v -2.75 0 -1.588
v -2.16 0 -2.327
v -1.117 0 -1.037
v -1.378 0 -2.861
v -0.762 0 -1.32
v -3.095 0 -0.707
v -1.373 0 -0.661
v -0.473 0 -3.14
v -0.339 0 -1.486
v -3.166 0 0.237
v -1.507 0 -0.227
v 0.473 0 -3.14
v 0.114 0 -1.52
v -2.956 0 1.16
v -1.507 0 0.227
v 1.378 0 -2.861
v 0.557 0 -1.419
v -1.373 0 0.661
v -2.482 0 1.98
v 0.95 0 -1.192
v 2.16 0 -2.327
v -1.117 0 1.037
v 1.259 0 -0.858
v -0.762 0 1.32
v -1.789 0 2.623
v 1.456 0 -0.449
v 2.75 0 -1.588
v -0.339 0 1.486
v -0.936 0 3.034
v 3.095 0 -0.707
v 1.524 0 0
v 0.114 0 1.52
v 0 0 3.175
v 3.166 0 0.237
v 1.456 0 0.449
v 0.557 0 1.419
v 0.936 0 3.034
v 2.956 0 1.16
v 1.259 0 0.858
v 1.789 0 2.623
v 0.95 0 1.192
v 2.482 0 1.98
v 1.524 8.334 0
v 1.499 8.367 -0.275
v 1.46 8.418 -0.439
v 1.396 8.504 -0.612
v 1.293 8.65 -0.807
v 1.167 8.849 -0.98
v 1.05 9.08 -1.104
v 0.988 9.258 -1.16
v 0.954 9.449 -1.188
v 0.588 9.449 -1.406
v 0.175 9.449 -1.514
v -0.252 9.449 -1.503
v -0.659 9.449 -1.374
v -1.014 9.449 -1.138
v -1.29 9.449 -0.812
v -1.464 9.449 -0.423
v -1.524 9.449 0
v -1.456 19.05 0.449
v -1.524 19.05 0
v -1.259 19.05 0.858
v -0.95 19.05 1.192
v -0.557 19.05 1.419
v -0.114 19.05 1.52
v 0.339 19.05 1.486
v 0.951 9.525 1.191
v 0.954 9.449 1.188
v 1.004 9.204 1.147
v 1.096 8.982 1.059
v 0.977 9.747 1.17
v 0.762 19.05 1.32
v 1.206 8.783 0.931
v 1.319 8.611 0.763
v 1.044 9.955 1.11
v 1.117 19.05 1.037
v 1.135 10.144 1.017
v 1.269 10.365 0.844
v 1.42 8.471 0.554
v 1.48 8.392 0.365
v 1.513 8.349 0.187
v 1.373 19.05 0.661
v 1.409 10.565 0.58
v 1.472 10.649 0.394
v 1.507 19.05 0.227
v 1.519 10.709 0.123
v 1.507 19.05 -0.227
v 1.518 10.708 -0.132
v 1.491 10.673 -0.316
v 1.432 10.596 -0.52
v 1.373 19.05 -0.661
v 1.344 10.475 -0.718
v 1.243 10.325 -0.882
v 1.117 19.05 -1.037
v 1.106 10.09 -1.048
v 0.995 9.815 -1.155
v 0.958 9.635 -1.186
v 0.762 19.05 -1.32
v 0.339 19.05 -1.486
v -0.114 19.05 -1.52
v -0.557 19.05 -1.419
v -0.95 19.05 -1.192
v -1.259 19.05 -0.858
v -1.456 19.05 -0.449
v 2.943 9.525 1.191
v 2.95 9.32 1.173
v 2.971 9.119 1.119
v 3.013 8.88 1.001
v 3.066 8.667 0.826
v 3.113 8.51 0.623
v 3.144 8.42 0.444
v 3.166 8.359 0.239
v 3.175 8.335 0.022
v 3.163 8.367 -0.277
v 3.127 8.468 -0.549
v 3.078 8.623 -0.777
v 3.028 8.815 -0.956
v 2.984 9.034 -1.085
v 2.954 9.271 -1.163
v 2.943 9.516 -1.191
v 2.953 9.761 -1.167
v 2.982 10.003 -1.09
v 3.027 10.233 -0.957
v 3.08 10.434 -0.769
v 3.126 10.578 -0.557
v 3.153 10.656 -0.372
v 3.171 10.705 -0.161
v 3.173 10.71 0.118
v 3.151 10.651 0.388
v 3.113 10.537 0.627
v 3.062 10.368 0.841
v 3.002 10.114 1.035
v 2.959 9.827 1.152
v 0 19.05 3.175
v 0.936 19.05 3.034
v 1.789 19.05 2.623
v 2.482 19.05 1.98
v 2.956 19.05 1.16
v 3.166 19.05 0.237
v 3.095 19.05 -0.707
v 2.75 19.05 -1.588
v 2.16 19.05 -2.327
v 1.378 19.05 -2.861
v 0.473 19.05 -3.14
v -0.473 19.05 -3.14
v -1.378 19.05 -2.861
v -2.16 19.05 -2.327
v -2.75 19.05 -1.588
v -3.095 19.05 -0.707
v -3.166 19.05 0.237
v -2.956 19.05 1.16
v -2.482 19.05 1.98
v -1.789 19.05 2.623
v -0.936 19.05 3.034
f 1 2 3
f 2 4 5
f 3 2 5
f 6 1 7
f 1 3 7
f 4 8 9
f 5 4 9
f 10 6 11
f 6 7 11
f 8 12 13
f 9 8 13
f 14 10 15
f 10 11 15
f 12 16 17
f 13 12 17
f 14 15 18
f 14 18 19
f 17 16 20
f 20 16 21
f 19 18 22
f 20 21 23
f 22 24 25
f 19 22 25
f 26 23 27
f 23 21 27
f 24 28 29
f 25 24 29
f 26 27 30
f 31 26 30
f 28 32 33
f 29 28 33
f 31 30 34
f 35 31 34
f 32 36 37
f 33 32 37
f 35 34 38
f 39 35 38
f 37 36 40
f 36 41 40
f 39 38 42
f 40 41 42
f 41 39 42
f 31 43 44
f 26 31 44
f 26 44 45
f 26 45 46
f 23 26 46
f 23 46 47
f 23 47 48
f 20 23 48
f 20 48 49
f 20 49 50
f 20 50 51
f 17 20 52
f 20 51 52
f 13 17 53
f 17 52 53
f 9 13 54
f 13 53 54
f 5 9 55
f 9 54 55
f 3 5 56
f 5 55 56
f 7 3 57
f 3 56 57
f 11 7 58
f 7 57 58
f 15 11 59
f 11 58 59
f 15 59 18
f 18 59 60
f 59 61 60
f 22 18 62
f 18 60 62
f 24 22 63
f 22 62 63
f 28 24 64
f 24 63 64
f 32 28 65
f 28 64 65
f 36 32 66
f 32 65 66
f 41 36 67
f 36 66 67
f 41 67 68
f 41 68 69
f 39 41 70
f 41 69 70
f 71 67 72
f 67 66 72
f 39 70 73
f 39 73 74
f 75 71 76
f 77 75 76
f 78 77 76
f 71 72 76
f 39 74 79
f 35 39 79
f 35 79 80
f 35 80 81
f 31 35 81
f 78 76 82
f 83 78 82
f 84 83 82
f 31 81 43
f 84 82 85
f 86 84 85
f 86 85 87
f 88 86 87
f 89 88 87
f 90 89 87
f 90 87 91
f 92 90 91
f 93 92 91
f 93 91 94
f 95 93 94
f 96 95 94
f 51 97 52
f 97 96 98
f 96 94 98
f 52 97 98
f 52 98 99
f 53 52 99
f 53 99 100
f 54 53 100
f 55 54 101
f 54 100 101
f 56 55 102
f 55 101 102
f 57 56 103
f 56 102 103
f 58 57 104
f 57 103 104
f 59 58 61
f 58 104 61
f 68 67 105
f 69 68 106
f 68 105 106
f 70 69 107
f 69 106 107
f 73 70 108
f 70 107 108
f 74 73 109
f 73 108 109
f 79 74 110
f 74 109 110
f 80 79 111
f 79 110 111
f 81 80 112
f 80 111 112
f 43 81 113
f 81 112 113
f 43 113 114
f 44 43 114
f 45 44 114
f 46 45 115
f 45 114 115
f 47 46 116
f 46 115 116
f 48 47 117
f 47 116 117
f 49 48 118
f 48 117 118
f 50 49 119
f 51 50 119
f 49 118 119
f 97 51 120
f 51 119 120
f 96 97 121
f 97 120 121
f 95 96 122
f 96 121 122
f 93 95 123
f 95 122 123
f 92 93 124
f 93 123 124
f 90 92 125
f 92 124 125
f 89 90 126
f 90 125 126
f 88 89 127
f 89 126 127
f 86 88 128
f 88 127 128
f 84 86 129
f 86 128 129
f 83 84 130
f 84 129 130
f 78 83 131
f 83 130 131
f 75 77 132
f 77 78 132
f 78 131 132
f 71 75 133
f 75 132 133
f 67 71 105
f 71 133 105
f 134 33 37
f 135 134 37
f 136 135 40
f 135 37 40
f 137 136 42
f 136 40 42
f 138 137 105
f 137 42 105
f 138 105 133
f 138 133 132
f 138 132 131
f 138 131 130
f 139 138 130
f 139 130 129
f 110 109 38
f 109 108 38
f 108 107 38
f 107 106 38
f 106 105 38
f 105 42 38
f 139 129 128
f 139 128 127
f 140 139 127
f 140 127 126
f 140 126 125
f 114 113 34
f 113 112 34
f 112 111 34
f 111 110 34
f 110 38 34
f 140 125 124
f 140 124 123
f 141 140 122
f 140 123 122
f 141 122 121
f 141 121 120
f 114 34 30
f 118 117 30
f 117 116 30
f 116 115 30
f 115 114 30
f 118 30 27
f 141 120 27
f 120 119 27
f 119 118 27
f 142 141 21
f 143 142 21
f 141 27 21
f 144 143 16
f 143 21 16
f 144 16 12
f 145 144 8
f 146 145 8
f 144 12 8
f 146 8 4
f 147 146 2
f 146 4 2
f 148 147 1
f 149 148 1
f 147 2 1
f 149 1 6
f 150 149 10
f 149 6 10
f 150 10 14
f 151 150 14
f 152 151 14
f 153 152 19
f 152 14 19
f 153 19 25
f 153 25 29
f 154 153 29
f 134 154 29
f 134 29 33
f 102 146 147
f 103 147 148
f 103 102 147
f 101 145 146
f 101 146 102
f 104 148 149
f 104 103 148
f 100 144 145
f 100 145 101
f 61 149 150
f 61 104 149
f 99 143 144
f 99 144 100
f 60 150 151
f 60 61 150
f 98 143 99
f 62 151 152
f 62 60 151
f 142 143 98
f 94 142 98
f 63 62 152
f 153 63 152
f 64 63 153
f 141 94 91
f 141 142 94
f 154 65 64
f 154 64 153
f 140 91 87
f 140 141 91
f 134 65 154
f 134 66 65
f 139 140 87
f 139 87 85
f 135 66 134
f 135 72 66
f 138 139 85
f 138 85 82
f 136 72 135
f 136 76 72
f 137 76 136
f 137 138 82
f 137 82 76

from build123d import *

# Parameters (mm, degrees)
SKETCH1_R                            = 3.175
SKETCH1_R_2                          = 1.5875
BOSS_EXTRUDE1_DEPTH                  = 19.05
TAPPED_HOLE_FOR_4_40_HELICOIL2_D     = 3.048
TAPPED_HOLE_FOR_4_40_HELICOIL2_DEPTH = 9.6012
TAPPED_HOLE_FOR_4_40_HELICOIL2_TIP   = 0.915711583
SKETCH7_W                            = 1.190625
SKETCH7_H                            = 3.175
TAPPED_HOLE_FOR_4_40_HELICOIL3_D     = 3.048
TAPPED_HOLE_FOR_4_40_HELICOIL3_DEPTH = 9.6012
TAPPED_HOLE_FOR_4_40_HELICOIL3_TIP   = 0.915711583


with BuildPart() as part:
    # Sketch1 → Boss-Extrude1 (new body)
    with BuildSketch(Plane(origin=(0, 0, 0), x_dir=(1, 0, 0), z_dir=(0, 1, 0))):
        with Locations(Location((0, 0, 0), (0, 0, 270))):  # turned: the seam where the file's is
            Circle(SKETCH1_R)
        Circle(SKETCH1_R_2, mode=Mode.SUBTRACT)
        Circle(SKETCH1_R_2)
    extrude(amount=BOSS_EXTRUDE1_DEPTH)

    # Tapped Hole for #4-40 Helicoil2
    with Locations(Plane(origin=(0, 19.05, 0), x_dir=(1, 0, 0), z_dir=(0, 1, 0))):
        with Locations((0, 0)):
            Hole(TAPPED_HOLE_FOR_4_40_HELICOIL2_D / 2, depth=TAPPED_HOLE_FOR_4_40_HELICOIL2_DEPTH)
            with Locations((0, 0, -(TAPPED_HOLE_FOR_4_40_HELICOIL2_DEPTH + TAPPED_HOLE_FOR_4_40_HELICOIL2_TIP / 2))):  # 118° drill point
                Cone(0, TAPPED_HOLE_FOR_4_40_HELICOIL2_D / 2, TAPPED_HOLE_FOR_4_40_HELICOIL2_TIP, mode=Mode.SUBTRACT)

    # Sketch7 → 3/32 (0.09375) Diameter Hole1 (revolve, cut)
    with BuildSketch(Plane.ZX.offset(9.525)):
        with Locations((0.5953125, 1.5875)):
            Rectangle(SKETCH7_W, SKETCH7_H)
    revolve(axis=Axis((-6.35, 9.525, 0), (1, 0, 0)), mode=Mode.SUBTRACT)

    # Tapped Hole for #4-40 Helicoil3
    with Locations(Plane(origin=(0, 0, 0), x_dir=(-1, 0, 0), z_dir=(0, -1, 0))):
        with Locations((0, 0)):
            Hole(TAPPED_HOLE_FOR_4_40_HELICOIL3_D / 2, depth=TAPPED_HOLE_FOR_4_40_HELICOIL3_DEPTH)
            with Locations((0, 0, -(TAPPED_HOLE_FOR_4_40_HELICOIL3_DEPTH + TAPPED_HOLE_FOR_4_40_HELICOIL3_TIP / 2))):  # 118° drill point
                Cone(0, TAPPED_HOLE_FOR_4_40_HELICOIL3_D / 2, TAPPED_HOLE_FOR_4_40_HELICOIL3_TIP, mode=Mode.SUBTRACT)


solid = part.part
